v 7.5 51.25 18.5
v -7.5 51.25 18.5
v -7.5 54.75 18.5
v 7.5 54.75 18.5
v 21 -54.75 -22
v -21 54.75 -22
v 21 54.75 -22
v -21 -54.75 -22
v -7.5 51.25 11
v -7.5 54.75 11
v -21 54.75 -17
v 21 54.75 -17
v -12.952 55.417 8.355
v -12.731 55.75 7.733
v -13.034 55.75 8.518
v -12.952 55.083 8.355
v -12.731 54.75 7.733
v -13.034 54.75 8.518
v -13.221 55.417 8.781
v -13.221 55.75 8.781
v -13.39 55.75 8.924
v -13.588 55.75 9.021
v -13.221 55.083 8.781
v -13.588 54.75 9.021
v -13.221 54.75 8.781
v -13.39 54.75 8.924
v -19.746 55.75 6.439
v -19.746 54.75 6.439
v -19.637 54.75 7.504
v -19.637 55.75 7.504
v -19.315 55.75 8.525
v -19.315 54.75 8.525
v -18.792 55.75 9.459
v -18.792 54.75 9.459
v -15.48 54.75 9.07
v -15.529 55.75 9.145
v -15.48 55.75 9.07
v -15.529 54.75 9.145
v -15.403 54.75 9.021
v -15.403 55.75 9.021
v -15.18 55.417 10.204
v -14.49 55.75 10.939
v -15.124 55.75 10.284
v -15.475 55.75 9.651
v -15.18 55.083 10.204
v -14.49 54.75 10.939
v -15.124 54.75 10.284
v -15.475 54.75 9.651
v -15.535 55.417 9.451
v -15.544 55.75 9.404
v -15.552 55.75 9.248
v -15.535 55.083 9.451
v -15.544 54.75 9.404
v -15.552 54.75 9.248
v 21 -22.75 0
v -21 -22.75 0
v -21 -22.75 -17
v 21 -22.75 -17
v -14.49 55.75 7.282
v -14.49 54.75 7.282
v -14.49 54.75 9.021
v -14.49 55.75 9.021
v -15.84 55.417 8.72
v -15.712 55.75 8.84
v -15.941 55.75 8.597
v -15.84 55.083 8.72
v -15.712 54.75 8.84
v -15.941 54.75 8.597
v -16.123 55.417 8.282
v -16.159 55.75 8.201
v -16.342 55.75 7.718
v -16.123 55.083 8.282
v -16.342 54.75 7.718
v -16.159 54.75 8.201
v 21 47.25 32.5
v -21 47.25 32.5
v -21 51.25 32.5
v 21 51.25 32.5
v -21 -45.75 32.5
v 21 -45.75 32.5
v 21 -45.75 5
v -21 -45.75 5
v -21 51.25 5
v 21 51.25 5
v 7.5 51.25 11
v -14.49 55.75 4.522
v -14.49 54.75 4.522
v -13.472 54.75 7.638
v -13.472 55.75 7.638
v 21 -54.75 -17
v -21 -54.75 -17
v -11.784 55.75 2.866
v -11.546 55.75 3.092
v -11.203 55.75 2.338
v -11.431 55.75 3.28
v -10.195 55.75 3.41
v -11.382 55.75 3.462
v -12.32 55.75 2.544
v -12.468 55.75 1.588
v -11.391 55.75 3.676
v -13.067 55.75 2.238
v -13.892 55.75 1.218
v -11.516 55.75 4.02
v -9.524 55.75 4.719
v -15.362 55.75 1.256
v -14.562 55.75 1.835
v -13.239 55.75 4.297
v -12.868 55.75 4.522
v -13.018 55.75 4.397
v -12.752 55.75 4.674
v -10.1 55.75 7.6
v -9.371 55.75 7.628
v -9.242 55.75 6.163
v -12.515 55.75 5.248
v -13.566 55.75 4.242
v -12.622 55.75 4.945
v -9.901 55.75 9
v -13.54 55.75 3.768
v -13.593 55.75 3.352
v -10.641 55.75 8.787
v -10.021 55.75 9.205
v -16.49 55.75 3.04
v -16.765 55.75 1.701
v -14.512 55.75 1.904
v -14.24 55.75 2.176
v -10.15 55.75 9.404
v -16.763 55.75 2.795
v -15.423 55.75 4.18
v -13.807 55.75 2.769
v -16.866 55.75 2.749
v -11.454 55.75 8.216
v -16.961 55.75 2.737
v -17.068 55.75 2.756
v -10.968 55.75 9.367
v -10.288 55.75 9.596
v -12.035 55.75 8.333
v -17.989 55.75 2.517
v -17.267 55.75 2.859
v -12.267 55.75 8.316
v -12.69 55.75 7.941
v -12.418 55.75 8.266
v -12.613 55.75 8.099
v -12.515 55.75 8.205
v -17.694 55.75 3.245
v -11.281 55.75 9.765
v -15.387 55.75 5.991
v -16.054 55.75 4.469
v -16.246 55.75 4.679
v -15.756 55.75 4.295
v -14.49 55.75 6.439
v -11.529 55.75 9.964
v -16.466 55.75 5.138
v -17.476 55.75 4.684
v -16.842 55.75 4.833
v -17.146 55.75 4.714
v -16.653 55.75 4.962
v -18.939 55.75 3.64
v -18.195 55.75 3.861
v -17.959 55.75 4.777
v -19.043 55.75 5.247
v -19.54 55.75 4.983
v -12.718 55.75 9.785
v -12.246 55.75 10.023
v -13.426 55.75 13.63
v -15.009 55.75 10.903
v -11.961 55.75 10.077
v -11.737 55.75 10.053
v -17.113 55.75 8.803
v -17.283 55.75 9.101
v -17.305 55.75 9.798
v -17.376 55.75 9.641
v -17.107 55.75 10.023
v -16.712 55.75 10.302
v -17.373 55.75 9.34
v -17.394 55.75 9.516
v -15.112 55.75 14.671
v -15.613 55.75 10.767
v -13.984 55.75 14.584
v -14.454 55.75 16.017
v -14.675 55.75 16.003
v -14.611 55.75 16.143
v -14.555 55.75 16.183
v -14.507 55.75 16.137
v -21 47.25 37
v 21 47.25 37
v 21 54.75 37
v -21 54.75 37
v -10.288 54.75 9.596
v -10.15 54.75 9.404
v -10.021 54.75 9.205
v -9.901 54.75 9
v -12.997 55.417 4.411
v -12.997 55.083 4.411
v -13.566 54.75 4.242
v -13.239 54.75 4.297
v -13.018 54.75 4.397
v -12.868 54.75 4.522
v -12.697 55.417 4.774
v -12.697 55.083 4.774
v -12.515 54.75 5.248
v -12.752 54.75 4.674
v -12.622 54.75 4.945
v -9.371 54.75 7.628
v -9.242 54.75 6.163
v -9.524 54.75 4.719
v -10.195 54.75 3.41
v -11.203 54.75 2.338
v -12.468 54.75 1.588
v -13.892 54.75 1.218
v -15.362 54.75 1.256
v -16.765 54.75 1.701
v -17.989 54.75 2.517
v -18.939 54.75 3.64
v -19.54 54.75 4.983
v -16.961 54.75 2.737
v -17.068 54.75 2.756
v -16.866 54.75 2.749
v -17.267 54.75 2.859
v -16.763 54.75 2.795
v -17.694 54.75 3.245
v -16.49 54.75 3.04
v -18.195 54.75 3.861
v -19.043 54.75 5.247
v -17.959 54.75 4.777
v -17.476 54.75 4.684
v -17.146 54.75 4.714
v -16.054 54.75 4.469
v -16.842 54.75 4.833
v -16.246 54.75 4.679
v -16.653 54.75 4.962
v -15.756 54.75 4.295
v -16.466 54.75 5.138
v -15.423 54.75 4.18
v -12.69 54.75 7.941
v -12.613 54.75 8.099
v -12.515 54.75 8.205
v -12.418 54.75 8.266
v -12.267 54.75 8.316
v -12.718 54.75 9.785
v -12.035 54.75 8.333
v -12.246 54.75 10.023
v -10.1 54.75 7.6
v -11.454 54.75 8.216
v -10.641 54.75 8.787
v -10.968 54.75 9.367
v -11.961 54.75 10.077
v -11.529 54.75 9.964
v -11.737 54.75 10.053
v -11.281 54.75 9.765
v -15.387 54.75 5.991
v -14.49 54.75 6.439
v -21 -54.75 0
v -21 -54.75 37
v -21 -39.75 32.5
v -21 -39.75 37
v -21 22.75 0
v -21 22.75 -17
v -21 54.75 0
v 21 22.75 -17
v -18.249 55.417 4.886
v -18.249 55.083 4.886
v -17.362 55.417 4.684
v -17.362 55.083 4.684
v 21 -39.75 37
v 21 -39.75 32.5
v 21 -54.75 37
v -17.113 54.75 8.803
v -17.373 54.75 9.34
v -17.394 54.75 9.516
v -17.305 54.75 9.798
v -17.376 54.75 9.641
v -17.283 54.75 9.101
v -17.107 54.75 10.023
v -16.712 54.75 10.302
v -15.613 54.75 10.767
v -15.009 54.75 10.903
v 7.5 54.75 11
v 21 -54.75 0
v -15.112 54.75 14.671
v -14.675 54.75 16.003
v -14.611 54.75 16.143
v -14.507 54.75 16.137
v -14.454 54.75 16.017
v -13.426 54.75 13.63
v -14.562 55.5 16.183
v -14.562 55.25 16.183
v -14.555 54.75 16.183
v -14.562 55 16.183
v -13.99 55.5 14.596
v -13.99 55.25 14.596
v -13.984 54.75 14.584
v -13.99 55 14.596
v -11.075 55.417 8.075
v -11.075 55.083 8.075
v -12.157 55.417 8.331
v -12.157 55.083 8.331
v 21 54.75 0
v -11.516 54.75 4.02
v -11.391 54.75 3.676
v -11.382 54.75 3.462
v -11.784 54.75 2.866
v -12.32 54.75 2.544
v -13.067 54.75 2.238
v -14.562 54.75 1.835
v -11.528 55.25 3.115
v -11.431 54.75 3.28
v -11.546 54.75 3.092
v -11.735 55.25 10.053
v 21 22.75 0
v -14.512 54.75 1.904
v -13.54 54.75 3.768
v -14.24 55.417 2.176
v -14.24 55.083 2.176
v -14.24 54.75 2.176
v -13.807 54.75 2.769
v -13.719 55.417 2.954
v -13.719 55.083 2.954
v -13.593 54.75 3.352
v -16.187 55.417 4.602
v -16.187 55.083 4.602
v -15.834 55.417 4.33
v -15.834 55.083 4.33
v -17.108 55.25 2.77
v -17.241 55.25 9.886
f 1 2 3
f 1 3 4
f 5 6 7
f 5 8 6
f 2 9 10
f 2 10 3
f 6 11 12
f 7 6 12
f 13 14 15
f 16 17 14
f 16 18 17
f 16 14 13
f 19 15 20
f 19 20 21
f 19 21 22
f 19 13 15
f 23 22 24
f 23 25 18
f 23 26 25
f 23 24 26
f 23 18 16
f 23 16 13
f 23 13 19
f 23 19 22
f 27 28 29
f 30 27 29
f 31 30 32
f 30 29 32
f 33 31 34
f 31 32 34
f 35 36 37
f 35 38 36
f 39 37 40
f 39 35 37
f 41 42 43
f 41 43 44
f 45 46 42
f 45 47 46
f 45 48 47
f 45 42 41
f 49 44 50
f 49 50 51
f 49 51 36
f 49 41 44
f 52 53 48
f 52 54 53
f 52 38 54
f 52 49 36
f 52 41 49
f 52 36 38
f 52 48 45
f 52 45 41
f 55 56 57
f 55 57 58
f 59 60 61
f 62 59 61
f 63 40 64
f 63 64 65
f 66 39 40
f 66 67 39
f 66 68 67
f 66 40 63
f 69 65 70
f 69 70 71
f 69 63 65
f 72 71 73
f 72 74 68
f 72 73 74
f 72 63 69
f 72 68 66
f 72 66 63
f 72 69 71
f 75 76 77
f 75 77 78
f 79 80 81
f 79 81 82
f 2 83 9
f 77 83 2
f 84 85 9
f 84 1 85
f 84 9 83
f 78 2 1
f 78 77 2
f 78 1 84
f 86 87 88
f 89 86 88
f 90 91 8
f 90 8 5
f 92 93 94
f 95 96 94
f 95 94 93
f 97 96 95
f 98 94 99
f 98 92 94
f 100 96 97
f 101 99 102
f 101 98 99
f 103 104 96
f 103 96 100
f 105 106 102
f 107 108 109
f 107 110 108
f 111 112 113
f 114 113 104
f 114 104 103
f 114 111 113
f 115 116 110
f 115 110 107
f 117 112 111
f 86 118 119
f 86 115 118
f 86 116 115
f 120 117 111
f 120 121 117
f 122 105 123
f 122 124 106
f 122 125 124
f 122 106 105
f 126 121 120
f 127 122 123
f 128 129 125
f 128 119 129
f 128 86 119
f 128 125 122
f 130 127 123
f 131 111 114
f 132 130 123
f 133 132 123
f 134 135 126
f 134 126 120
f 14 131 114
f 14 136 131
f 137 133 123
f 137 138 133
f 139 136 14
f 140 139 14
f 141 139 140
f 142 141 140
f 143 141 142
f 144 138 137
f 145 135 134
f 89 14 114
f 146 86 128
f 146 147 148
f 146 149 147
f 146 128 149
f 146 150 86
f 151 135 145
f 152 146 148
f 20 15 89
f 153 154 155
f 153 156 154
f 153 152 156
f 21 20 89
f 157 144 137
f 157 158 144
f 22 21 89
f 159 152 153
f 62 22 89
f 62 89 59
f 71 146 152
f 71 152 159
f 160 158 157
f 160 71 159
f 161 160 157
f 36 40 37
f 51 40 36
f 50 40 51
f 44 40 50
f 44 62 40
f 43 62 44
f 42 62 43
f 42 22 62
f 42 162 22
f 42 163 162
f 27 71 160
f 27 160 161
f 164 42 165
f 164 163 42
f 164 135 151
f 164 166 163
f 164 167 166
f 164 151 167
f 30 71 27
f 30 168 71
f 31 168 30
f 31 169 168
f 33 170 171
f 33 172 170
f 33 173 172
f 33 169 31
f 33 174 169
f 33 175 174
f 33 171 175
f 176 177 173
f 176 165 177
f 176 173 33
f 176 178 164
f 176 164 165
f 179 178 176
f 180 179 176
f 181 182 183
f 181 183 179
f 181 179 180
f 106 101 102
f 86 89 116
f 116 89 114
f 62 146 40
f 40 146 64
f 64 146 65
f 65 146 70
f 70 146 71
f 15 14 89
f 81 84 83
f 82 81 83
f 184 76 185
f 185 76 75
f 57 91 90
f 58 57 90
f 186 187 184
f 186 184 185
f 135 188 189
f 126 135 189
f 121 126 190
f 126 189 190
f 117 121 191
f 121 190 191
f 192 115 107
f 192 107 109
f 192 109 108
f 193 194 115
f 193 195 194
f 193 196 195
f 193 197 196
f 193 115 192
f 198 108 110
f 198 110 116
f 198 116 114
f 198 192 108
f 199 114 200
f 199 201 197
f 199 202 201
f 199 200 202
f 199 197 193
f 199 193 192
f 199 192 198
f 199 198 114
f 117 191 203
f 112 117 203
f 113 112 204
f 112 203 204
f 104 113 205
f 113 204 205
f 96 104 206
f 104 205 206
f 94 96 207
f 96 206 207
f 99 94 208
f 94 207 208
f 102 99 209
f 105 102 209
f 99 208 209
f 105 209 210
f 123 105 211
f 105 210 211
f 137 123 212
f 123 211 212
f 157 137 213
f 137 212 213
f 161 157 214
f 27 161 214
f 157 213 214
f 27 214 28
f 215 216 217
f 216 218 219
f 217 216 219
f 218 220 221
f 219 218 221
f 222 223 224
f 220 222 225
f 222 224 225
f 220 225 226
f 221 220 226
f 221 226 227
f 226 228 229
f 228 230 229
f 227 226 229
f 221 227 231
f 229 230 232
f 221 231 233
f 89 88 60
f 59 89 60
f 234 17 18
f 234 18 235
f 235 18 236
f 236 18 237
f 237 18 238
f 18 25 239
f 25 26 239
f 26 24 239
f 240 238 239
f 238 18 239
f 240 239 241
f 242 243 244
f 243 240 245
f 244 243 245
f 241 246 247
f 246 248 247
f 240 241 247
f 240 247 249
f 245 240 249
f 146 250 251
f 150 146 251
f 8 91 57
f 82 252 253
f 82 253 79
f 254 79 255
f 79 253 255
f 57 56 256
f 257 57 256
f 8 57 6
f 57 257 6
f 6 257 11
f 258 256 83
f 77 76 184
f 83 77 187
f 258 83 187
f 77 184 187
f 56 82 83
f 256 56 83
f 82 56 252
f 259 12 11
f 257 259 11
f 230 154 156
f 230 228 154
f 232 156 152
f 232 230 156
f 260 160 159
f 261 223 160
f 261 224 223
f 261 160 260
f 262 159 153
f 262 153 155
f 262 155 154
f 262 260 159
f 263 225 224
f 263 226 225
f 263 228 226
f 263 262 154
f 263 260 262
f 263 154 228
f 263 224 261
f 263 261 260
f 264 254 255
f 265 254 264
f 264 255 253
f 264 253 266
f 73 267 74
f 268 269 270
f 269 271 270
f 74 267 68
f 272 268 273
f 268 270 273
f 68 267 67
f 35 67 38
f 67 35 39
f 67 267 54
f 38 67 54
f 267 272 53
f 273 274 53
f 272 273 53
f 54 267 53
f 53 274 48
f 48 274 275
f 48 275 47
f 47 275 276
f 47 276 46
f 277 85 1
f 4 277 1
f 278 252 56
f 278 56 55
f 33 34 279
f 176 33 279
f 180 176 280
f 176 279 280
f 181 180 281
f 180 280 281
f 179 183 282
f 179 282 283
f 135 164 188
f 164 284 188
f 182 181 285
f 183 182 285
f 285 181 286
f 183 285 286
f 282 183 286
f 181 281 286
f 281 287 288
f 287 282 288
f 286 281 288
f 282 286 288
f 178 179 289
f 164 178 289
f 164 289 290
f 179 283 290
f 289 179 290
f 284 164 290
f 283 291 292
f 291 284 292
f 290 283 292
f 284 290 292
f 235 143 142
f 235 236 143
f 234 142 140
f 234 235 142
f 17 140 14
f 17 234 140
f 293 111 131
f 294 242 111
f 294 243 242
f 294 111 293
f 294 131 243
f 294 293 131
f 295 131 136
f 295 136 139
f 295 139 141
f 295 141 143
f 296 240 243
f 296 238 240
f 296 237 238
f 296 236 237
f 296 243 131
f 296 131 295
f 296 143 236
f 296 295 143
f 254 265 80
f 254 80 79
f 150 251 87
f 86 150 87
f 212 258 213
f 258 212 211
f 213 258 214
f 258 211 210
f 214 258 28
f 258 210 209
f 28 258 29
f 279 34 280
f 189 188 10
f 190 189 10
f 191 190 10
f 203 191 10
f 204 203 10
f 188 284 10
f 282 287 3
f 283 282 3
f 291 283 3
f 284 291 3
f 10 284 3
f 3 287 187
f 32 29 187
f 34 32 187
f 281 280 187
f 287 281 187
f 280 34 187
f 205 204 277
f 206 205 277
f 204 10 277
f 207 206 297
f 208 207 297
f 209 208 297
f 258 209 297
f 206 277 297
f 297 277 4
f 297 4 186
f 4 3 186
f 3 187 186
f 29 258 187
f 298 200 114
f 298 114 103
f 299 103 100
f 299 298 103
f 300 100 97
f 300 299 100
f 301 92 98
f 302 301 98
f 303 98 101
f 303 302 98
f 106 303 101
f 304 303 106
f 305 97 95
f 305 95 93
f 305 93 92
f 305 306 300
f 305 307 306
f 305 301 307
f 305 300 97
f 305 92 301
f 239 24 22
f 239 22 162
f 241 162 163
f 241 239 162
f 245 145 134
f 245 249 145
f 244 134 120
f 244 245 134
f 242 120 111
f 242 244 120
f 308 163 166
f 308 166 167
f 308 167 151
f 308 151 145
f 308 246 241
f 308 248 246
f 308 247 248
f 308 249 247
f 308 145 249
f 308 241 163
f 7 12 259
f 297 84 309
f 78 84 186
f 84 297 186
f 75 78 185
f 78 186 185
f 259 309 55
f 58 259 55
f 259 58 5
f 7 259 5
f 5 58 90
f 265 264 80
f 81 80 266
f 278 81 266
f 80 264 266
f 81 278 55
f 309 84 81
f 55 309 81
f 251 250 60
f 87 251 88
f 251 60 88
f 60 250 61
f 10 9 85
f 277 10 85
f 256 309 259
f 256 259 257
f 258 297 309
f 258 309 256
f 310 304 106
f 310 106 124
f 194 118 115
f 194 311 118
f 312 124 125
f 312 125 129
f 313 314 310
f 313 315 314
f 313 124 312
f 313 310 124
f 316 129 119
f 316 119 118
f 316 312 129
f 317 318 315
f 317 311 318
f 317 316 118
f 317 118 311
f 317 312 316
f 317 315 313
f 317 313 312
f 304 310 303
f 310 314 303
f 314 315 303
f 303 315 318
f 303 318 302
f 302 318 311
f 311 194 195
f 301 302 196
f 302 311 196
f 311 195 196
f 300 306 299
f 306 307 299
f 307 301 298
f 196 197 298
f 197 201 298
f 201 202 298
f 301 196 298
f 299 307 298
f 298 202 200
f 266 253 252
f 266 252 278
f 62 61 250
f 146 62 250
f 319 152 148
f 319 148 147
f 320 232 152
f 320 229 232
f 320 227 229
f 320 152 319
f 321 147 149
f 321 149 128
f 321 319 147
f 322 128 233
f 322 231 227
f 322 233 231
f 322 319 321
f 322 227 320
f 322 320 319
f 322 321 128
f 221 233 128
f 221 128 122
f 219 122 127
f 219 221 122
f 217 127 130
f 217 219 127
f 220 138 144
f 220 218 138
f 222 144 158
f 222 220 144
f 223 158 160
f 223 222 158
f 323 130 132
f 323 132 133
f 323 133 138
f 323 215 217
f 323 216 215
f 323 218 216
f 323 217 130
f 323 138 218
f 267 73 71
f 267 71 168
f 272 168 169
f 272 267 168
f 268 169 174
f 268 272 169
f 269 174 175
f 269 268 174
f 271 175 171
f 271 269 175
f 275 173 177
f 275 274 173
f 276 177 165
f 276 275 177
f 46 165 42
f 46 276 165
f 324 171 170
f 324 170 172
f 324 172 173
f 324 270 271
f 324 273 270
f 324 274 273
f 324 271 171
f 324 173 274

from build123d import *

# Parameters (mm, degrees)
F0_W      = 42
F0_H      = 109.5
F1_DEPTH  = 5
F2_W      = 42
F2_H      = 7.5
F2_H_2    = 15
F3_DEPTH  = 32
F4_W      = 42
F4_H      = 27.5
F5_DEPTH  = 4
F6_W      = 42
F6_H      = 27.5
F7_DEPTH  = 6
F8_W      = 15
F8_H      = 7.5
F9_DEPTH  = 3.501
F10_W     = 42
F10_H     = 54.75
F11_DEPTH = 22
F12_W     = 42
F12_H     = 17
F13_DEPTH = 32
F14_W     = 42
F14_H     = 17
F15_DEPTH = 32
F17_DEPTH = 1


# Not quite as in the source:
# - a feature names something its author has since deleted; it is built from what else it names


with BuildPart() as f1:
    # F0 (on Top) → F1 (new body)
    with BuildSketch(Plane.XY):
        Rectangle(F0_W, F0_H)
    extrude(amount=F1_DEPTH)

    # F2 (on face) → F3 (join)
    with BuildSketch(Plane.XY.offset(5)):
        with Locations((0, 51)):
            Rectangle(F2_W, F2_H)
        with Locations((0, -47.25)):
            Rectangle(F2_W, F2_H_2)
    extrude(amount=F3_DEPTH)

    # F4 (on face) → F5 (cut)
    with BuildSketch(Plane.XZ.offset(-47.25)):
        with Locations((0, 18.75)):
            Rectangle(F4_W, F4_H)
    extrude(amount=-F5_DEPTH, mode=Mode.SUBTRACT)

    # F6 (on face) → F7 (cut)
    with BuildSketch(Plane(origin=(0, -39.75, 0), x_dir=(-1, 0, 0), z_dir=(0, 1, 0))):
        with Locations((0, 18.75)):
            Rectangle(F6_W, F6_H)
    extrude(amount=-F7_DEPTH, mode=Mode.SUBTRACT)

    # F8 (on face) → F9 (cut, through all)
    with BuildSketch(Plane.XZ.offset(-51.25)):
        with Locations((0, 14.75)):
            Rectangle(F8_W, F8_H)
    extrude(amount=-F9_DEPTH, mode=Mode.SUBTRACT)

    # F10 (on face) → F11 (join)
    with BuildSketch(Plane(origin=(0, 0, 0), x_dir=(1, 0, 0), z_dir=(0, 0, -1))):
        with Locations((0, -27.375)):
            Rectangle(F10_W, F10_H)
        with Locations((0, 27.375)):
            Rectangle(F10_W, F10_H)
    extrude(amount=F11_DEPTH)

    # F12 (on face) → F13 (cut)
    with BuildSketch(Plane(origin=(0, 54.75, 0), x_dir=(-1, 0, 0), z_dir=(0, 1, 0))):
        with Locations((0, -8.5)):
            Rectangle(F12_W, F12_H)
    extrude(amount=-F13_DEPTH, mode=Mode.SUBTRACT)

    # F14 (on face) → F15 (cut)
    with BuildSketch(Plane.XZ.offset(54.75)):
        with Locations((0, -8.5)):
            Rectangle(F14_W, F14_H)
    extrude(amount=-F15_DEPTH, mode=Mode.SUBTRACT)

    # F16 (on face) → F17 (join)
    with BuildSketch(Plane(origin=(0, 54.75, 0), x_dir=(-1, 0, 0), z_dir=(0, 1, 0))):
        with BuildLine():
            ThreePointArc((9.9006995692, 9.0004714316), (13.1670561221, 1.352687349), (19.7461517383, 6.4392566621))
            ThreePointArc((19.7461517383, 6.4392566621), (19.5019885984, 8.0225954525), (18.7921845523, 9.458825093))
            ThreePointArc((18.7921845523, 9.458825093), (14.575302704, 11.6944347601), (10.2883124178, 9.5963982037))
            add(Edge.make_bspline(
                [(9.9006995692, 9.0004714316), (10.0318943543, 9.2081460376), (10.1611439812, 9.4065291941), (10.2883124178, 9.5963982037)],
                knots=[0, 0, 0, 0, 0.0231761706, 0.0231761706, 0.0231761706, 0.0231761706], degree=3))
        make_face()
        with BuildLine():
            add(Edge.make_bspline(
                [(12.5148005536, 5.2476986911), (11.5117744305, 4.2282460665), (10.7037792288, 2.9078259209), (13.5031697151, 2.0462179781), (14.5618504929, 1.8354499162)],
                knots=[0, 0, 0, 0, 0.4579310006, 1, 1, 1, 1], degree=3))
            add(Edge.make_bspline(
                [(13.5659415486, 4.241716412), (12.8136013619, 4.2865276682), (12.6872834074, 4.7459304754), (12.5148005536, 5.2476986911)],
                knots=[0, 0, 0, 0, 1.4549562665, 1.4549562665, 1.4549562665, 1.4549562665], degree=3))
            add(Edge.make_bspline(
                [(14.5618504929, 1.8354499162), (14.5289066888, 1.9808173354), (13.3458541311, 2.6761364671), (13.5659415486, 4.241716412)],
                knots=[0, 0, 0, 0, 2.604218323, 2.604218323, 2.604218323, 2.604218323], degree=3))
        make_face(mode=Mode.SUBTRACT)
        Polygon((13.47238521, 7.6377728132), (14.4902859979, 7.2816363839), (14.4902859979, 9.0213598503), (15.3866174204, 5.9906424503), (14.4902859979, 6.4392566621), (14.4902859979, 4.5215808953), align=None, mode=Mode.SUBTRACT)
        with BuildLine():
            add(Edge.make_bspline(
                [(15.4229601255, 4.1801771125), (16.5064311467, 3.1538456327), (16.8590547707, 1.9119603138), (18.5636819849, 4.2745726241), (19.0433704887, 5.2473602224)],
                knots=[0, 0, 0, 0, 0.4553347248, 1, 1, 1, 1], degree=3))
            add(Edge.make_bspline(
                [(16.4662250147, 5.1379367456), (16.2283618655, 4.4227829667), (15.8584250881, 4.3158873473), (15.4229601255, 4.1801771125)],
                knots=[0, 0, 0, 0, 1.4162291989, 1.4162291989, 1.4162291989, 1.4162291989], degree=3))
            add(Edge.make_bspline(
                [(19.0433704887, 5.2473602224), (18.3244173567, 4.9723164216), (17.3367887913, 4.1913386793), (16.4662250147, 5.1379367456)],
                knots=[0, 0, 0, 0, 2.5794674433, 2.5794674433, 2.5794674433, 2.5794674433], degree=3))
        make_face(mode=Mode.SUBTRACT)
        with BuildLine():
            add(Edge.make_bspline(
                [(13.5878011524, 9.0213598503), (13.0643112241, 9.5784787958), (11.4580836083, 10.9555165738), (10.5407517819, 8.58324464), (10.0999996066, 7.6000010595)],
                knots=[0, 0, 0, 0, 0.4589082861, 1, 1, 1, 1], degree=3))
            add(Edge.make_bspline(
                [(12.7311412425, 7.7330306741), (12.9425972845, 8.4564324625), (13.1576102672, 8.8697590463), (13.5878011524, 9.0213598503)],
                knots=[0, 0, 0, 0, 1.5471451992, 1.5471451992, 1.5471451992, 1.5471451992], degree=3))
            add(Edge.make_bspline(
                [(10.0999996066, 7.6000010595), (10.8170407506, 7.9740767086), (12.6145526151, 8.968960396), (12.7311412425, 7.7330306741)],
                knots=[0, 0, 0, 0, 2.5509056967, 2.5509056967, 2.5509056967, 2.5509056967], degree=3))
        make_face(mode=Mode.SUBTRACT)
        with BuildLine():
            add(Edge.make_bspline(
                [(16.3422210337, 7.7180123234), (17.2475090665, 8.9627835512), (18.0662711639, 9.9191930916), (15.3852159818, 10.9699756355), (14.4902859979, 10.9392784796)],
                knots=[0, 0, 0, 0, 0.4716209514, 1, 1, 1, 1], degree=3))
            add(Edge.make_bspline(
                [(15.403256887, 9.0213598503), (15.9476549795, 8.7934285242), (16.1248632097, 8.3395995036), (16.3422210337, 7.7180123234)],
                knots=[0, 0, 0, 0, 1.6063525282, 1.6063525282, 1.6063525282, 1.6063525282], degree=3))
            add(Edge.make_bspline(
                [(14.4902859979, 10.9392784796), (15.2978175145, 10.325451744), (15.8282139034, 9.1764941327), (15.403256887, 9.0213598503)],
                knots=[0, 0, 0, 0, 2.1241298719, 2.1241298719, 2.1241298719, 2.1241298719], degree=3))
        make_face(mode=Mode.SUBTRACT)
        with BuildLine():
            ThreePointArc((10.2883124178, 9.5963982037), (14.575302704, 11.6944347601), (18.7921845523, 9.458825093))
            add(Edge.make_bspline(
                [(10.2883124178, 9.5963982037), (12.0270262465, 12.1923872829), (14.0912584145, 13.7285191545), (14.5502114191, 17.0414015202), (15.1068634627, 13.6426153488), (16.9710466455, 12.3841964531), (18.7921845523, 9.458825093)],
                knots=[0.0231761706, 0.0231761706, 0.0231761706, 0.0231761706, 0.3400529794, 0.5078220439, 0.6757544935, 1, 1, 1, 1], degree=3))
        make_face()
        with BuildLine():
            ThreePointArc((10.2883124178, 9.5963982037), (10.0844189973, 9.3049957736), (9.9006995692, 9.0004714316))
            add(Edge.make_bspline(
                [(9.9006995692, 9.0004714316), (10.0318943543, 9.2081460376), (10.1611439812, 9.4065291941), (10.2883124178, 9.5963982037)],
                knots=[0, 0, 0, 0, 0.0231761706, 0.0231761706, 0.0231761706, 0.0231761706], degree=3))
        make_face()
    extrude(amount=F17_DEPTH)


solid = f1.part
